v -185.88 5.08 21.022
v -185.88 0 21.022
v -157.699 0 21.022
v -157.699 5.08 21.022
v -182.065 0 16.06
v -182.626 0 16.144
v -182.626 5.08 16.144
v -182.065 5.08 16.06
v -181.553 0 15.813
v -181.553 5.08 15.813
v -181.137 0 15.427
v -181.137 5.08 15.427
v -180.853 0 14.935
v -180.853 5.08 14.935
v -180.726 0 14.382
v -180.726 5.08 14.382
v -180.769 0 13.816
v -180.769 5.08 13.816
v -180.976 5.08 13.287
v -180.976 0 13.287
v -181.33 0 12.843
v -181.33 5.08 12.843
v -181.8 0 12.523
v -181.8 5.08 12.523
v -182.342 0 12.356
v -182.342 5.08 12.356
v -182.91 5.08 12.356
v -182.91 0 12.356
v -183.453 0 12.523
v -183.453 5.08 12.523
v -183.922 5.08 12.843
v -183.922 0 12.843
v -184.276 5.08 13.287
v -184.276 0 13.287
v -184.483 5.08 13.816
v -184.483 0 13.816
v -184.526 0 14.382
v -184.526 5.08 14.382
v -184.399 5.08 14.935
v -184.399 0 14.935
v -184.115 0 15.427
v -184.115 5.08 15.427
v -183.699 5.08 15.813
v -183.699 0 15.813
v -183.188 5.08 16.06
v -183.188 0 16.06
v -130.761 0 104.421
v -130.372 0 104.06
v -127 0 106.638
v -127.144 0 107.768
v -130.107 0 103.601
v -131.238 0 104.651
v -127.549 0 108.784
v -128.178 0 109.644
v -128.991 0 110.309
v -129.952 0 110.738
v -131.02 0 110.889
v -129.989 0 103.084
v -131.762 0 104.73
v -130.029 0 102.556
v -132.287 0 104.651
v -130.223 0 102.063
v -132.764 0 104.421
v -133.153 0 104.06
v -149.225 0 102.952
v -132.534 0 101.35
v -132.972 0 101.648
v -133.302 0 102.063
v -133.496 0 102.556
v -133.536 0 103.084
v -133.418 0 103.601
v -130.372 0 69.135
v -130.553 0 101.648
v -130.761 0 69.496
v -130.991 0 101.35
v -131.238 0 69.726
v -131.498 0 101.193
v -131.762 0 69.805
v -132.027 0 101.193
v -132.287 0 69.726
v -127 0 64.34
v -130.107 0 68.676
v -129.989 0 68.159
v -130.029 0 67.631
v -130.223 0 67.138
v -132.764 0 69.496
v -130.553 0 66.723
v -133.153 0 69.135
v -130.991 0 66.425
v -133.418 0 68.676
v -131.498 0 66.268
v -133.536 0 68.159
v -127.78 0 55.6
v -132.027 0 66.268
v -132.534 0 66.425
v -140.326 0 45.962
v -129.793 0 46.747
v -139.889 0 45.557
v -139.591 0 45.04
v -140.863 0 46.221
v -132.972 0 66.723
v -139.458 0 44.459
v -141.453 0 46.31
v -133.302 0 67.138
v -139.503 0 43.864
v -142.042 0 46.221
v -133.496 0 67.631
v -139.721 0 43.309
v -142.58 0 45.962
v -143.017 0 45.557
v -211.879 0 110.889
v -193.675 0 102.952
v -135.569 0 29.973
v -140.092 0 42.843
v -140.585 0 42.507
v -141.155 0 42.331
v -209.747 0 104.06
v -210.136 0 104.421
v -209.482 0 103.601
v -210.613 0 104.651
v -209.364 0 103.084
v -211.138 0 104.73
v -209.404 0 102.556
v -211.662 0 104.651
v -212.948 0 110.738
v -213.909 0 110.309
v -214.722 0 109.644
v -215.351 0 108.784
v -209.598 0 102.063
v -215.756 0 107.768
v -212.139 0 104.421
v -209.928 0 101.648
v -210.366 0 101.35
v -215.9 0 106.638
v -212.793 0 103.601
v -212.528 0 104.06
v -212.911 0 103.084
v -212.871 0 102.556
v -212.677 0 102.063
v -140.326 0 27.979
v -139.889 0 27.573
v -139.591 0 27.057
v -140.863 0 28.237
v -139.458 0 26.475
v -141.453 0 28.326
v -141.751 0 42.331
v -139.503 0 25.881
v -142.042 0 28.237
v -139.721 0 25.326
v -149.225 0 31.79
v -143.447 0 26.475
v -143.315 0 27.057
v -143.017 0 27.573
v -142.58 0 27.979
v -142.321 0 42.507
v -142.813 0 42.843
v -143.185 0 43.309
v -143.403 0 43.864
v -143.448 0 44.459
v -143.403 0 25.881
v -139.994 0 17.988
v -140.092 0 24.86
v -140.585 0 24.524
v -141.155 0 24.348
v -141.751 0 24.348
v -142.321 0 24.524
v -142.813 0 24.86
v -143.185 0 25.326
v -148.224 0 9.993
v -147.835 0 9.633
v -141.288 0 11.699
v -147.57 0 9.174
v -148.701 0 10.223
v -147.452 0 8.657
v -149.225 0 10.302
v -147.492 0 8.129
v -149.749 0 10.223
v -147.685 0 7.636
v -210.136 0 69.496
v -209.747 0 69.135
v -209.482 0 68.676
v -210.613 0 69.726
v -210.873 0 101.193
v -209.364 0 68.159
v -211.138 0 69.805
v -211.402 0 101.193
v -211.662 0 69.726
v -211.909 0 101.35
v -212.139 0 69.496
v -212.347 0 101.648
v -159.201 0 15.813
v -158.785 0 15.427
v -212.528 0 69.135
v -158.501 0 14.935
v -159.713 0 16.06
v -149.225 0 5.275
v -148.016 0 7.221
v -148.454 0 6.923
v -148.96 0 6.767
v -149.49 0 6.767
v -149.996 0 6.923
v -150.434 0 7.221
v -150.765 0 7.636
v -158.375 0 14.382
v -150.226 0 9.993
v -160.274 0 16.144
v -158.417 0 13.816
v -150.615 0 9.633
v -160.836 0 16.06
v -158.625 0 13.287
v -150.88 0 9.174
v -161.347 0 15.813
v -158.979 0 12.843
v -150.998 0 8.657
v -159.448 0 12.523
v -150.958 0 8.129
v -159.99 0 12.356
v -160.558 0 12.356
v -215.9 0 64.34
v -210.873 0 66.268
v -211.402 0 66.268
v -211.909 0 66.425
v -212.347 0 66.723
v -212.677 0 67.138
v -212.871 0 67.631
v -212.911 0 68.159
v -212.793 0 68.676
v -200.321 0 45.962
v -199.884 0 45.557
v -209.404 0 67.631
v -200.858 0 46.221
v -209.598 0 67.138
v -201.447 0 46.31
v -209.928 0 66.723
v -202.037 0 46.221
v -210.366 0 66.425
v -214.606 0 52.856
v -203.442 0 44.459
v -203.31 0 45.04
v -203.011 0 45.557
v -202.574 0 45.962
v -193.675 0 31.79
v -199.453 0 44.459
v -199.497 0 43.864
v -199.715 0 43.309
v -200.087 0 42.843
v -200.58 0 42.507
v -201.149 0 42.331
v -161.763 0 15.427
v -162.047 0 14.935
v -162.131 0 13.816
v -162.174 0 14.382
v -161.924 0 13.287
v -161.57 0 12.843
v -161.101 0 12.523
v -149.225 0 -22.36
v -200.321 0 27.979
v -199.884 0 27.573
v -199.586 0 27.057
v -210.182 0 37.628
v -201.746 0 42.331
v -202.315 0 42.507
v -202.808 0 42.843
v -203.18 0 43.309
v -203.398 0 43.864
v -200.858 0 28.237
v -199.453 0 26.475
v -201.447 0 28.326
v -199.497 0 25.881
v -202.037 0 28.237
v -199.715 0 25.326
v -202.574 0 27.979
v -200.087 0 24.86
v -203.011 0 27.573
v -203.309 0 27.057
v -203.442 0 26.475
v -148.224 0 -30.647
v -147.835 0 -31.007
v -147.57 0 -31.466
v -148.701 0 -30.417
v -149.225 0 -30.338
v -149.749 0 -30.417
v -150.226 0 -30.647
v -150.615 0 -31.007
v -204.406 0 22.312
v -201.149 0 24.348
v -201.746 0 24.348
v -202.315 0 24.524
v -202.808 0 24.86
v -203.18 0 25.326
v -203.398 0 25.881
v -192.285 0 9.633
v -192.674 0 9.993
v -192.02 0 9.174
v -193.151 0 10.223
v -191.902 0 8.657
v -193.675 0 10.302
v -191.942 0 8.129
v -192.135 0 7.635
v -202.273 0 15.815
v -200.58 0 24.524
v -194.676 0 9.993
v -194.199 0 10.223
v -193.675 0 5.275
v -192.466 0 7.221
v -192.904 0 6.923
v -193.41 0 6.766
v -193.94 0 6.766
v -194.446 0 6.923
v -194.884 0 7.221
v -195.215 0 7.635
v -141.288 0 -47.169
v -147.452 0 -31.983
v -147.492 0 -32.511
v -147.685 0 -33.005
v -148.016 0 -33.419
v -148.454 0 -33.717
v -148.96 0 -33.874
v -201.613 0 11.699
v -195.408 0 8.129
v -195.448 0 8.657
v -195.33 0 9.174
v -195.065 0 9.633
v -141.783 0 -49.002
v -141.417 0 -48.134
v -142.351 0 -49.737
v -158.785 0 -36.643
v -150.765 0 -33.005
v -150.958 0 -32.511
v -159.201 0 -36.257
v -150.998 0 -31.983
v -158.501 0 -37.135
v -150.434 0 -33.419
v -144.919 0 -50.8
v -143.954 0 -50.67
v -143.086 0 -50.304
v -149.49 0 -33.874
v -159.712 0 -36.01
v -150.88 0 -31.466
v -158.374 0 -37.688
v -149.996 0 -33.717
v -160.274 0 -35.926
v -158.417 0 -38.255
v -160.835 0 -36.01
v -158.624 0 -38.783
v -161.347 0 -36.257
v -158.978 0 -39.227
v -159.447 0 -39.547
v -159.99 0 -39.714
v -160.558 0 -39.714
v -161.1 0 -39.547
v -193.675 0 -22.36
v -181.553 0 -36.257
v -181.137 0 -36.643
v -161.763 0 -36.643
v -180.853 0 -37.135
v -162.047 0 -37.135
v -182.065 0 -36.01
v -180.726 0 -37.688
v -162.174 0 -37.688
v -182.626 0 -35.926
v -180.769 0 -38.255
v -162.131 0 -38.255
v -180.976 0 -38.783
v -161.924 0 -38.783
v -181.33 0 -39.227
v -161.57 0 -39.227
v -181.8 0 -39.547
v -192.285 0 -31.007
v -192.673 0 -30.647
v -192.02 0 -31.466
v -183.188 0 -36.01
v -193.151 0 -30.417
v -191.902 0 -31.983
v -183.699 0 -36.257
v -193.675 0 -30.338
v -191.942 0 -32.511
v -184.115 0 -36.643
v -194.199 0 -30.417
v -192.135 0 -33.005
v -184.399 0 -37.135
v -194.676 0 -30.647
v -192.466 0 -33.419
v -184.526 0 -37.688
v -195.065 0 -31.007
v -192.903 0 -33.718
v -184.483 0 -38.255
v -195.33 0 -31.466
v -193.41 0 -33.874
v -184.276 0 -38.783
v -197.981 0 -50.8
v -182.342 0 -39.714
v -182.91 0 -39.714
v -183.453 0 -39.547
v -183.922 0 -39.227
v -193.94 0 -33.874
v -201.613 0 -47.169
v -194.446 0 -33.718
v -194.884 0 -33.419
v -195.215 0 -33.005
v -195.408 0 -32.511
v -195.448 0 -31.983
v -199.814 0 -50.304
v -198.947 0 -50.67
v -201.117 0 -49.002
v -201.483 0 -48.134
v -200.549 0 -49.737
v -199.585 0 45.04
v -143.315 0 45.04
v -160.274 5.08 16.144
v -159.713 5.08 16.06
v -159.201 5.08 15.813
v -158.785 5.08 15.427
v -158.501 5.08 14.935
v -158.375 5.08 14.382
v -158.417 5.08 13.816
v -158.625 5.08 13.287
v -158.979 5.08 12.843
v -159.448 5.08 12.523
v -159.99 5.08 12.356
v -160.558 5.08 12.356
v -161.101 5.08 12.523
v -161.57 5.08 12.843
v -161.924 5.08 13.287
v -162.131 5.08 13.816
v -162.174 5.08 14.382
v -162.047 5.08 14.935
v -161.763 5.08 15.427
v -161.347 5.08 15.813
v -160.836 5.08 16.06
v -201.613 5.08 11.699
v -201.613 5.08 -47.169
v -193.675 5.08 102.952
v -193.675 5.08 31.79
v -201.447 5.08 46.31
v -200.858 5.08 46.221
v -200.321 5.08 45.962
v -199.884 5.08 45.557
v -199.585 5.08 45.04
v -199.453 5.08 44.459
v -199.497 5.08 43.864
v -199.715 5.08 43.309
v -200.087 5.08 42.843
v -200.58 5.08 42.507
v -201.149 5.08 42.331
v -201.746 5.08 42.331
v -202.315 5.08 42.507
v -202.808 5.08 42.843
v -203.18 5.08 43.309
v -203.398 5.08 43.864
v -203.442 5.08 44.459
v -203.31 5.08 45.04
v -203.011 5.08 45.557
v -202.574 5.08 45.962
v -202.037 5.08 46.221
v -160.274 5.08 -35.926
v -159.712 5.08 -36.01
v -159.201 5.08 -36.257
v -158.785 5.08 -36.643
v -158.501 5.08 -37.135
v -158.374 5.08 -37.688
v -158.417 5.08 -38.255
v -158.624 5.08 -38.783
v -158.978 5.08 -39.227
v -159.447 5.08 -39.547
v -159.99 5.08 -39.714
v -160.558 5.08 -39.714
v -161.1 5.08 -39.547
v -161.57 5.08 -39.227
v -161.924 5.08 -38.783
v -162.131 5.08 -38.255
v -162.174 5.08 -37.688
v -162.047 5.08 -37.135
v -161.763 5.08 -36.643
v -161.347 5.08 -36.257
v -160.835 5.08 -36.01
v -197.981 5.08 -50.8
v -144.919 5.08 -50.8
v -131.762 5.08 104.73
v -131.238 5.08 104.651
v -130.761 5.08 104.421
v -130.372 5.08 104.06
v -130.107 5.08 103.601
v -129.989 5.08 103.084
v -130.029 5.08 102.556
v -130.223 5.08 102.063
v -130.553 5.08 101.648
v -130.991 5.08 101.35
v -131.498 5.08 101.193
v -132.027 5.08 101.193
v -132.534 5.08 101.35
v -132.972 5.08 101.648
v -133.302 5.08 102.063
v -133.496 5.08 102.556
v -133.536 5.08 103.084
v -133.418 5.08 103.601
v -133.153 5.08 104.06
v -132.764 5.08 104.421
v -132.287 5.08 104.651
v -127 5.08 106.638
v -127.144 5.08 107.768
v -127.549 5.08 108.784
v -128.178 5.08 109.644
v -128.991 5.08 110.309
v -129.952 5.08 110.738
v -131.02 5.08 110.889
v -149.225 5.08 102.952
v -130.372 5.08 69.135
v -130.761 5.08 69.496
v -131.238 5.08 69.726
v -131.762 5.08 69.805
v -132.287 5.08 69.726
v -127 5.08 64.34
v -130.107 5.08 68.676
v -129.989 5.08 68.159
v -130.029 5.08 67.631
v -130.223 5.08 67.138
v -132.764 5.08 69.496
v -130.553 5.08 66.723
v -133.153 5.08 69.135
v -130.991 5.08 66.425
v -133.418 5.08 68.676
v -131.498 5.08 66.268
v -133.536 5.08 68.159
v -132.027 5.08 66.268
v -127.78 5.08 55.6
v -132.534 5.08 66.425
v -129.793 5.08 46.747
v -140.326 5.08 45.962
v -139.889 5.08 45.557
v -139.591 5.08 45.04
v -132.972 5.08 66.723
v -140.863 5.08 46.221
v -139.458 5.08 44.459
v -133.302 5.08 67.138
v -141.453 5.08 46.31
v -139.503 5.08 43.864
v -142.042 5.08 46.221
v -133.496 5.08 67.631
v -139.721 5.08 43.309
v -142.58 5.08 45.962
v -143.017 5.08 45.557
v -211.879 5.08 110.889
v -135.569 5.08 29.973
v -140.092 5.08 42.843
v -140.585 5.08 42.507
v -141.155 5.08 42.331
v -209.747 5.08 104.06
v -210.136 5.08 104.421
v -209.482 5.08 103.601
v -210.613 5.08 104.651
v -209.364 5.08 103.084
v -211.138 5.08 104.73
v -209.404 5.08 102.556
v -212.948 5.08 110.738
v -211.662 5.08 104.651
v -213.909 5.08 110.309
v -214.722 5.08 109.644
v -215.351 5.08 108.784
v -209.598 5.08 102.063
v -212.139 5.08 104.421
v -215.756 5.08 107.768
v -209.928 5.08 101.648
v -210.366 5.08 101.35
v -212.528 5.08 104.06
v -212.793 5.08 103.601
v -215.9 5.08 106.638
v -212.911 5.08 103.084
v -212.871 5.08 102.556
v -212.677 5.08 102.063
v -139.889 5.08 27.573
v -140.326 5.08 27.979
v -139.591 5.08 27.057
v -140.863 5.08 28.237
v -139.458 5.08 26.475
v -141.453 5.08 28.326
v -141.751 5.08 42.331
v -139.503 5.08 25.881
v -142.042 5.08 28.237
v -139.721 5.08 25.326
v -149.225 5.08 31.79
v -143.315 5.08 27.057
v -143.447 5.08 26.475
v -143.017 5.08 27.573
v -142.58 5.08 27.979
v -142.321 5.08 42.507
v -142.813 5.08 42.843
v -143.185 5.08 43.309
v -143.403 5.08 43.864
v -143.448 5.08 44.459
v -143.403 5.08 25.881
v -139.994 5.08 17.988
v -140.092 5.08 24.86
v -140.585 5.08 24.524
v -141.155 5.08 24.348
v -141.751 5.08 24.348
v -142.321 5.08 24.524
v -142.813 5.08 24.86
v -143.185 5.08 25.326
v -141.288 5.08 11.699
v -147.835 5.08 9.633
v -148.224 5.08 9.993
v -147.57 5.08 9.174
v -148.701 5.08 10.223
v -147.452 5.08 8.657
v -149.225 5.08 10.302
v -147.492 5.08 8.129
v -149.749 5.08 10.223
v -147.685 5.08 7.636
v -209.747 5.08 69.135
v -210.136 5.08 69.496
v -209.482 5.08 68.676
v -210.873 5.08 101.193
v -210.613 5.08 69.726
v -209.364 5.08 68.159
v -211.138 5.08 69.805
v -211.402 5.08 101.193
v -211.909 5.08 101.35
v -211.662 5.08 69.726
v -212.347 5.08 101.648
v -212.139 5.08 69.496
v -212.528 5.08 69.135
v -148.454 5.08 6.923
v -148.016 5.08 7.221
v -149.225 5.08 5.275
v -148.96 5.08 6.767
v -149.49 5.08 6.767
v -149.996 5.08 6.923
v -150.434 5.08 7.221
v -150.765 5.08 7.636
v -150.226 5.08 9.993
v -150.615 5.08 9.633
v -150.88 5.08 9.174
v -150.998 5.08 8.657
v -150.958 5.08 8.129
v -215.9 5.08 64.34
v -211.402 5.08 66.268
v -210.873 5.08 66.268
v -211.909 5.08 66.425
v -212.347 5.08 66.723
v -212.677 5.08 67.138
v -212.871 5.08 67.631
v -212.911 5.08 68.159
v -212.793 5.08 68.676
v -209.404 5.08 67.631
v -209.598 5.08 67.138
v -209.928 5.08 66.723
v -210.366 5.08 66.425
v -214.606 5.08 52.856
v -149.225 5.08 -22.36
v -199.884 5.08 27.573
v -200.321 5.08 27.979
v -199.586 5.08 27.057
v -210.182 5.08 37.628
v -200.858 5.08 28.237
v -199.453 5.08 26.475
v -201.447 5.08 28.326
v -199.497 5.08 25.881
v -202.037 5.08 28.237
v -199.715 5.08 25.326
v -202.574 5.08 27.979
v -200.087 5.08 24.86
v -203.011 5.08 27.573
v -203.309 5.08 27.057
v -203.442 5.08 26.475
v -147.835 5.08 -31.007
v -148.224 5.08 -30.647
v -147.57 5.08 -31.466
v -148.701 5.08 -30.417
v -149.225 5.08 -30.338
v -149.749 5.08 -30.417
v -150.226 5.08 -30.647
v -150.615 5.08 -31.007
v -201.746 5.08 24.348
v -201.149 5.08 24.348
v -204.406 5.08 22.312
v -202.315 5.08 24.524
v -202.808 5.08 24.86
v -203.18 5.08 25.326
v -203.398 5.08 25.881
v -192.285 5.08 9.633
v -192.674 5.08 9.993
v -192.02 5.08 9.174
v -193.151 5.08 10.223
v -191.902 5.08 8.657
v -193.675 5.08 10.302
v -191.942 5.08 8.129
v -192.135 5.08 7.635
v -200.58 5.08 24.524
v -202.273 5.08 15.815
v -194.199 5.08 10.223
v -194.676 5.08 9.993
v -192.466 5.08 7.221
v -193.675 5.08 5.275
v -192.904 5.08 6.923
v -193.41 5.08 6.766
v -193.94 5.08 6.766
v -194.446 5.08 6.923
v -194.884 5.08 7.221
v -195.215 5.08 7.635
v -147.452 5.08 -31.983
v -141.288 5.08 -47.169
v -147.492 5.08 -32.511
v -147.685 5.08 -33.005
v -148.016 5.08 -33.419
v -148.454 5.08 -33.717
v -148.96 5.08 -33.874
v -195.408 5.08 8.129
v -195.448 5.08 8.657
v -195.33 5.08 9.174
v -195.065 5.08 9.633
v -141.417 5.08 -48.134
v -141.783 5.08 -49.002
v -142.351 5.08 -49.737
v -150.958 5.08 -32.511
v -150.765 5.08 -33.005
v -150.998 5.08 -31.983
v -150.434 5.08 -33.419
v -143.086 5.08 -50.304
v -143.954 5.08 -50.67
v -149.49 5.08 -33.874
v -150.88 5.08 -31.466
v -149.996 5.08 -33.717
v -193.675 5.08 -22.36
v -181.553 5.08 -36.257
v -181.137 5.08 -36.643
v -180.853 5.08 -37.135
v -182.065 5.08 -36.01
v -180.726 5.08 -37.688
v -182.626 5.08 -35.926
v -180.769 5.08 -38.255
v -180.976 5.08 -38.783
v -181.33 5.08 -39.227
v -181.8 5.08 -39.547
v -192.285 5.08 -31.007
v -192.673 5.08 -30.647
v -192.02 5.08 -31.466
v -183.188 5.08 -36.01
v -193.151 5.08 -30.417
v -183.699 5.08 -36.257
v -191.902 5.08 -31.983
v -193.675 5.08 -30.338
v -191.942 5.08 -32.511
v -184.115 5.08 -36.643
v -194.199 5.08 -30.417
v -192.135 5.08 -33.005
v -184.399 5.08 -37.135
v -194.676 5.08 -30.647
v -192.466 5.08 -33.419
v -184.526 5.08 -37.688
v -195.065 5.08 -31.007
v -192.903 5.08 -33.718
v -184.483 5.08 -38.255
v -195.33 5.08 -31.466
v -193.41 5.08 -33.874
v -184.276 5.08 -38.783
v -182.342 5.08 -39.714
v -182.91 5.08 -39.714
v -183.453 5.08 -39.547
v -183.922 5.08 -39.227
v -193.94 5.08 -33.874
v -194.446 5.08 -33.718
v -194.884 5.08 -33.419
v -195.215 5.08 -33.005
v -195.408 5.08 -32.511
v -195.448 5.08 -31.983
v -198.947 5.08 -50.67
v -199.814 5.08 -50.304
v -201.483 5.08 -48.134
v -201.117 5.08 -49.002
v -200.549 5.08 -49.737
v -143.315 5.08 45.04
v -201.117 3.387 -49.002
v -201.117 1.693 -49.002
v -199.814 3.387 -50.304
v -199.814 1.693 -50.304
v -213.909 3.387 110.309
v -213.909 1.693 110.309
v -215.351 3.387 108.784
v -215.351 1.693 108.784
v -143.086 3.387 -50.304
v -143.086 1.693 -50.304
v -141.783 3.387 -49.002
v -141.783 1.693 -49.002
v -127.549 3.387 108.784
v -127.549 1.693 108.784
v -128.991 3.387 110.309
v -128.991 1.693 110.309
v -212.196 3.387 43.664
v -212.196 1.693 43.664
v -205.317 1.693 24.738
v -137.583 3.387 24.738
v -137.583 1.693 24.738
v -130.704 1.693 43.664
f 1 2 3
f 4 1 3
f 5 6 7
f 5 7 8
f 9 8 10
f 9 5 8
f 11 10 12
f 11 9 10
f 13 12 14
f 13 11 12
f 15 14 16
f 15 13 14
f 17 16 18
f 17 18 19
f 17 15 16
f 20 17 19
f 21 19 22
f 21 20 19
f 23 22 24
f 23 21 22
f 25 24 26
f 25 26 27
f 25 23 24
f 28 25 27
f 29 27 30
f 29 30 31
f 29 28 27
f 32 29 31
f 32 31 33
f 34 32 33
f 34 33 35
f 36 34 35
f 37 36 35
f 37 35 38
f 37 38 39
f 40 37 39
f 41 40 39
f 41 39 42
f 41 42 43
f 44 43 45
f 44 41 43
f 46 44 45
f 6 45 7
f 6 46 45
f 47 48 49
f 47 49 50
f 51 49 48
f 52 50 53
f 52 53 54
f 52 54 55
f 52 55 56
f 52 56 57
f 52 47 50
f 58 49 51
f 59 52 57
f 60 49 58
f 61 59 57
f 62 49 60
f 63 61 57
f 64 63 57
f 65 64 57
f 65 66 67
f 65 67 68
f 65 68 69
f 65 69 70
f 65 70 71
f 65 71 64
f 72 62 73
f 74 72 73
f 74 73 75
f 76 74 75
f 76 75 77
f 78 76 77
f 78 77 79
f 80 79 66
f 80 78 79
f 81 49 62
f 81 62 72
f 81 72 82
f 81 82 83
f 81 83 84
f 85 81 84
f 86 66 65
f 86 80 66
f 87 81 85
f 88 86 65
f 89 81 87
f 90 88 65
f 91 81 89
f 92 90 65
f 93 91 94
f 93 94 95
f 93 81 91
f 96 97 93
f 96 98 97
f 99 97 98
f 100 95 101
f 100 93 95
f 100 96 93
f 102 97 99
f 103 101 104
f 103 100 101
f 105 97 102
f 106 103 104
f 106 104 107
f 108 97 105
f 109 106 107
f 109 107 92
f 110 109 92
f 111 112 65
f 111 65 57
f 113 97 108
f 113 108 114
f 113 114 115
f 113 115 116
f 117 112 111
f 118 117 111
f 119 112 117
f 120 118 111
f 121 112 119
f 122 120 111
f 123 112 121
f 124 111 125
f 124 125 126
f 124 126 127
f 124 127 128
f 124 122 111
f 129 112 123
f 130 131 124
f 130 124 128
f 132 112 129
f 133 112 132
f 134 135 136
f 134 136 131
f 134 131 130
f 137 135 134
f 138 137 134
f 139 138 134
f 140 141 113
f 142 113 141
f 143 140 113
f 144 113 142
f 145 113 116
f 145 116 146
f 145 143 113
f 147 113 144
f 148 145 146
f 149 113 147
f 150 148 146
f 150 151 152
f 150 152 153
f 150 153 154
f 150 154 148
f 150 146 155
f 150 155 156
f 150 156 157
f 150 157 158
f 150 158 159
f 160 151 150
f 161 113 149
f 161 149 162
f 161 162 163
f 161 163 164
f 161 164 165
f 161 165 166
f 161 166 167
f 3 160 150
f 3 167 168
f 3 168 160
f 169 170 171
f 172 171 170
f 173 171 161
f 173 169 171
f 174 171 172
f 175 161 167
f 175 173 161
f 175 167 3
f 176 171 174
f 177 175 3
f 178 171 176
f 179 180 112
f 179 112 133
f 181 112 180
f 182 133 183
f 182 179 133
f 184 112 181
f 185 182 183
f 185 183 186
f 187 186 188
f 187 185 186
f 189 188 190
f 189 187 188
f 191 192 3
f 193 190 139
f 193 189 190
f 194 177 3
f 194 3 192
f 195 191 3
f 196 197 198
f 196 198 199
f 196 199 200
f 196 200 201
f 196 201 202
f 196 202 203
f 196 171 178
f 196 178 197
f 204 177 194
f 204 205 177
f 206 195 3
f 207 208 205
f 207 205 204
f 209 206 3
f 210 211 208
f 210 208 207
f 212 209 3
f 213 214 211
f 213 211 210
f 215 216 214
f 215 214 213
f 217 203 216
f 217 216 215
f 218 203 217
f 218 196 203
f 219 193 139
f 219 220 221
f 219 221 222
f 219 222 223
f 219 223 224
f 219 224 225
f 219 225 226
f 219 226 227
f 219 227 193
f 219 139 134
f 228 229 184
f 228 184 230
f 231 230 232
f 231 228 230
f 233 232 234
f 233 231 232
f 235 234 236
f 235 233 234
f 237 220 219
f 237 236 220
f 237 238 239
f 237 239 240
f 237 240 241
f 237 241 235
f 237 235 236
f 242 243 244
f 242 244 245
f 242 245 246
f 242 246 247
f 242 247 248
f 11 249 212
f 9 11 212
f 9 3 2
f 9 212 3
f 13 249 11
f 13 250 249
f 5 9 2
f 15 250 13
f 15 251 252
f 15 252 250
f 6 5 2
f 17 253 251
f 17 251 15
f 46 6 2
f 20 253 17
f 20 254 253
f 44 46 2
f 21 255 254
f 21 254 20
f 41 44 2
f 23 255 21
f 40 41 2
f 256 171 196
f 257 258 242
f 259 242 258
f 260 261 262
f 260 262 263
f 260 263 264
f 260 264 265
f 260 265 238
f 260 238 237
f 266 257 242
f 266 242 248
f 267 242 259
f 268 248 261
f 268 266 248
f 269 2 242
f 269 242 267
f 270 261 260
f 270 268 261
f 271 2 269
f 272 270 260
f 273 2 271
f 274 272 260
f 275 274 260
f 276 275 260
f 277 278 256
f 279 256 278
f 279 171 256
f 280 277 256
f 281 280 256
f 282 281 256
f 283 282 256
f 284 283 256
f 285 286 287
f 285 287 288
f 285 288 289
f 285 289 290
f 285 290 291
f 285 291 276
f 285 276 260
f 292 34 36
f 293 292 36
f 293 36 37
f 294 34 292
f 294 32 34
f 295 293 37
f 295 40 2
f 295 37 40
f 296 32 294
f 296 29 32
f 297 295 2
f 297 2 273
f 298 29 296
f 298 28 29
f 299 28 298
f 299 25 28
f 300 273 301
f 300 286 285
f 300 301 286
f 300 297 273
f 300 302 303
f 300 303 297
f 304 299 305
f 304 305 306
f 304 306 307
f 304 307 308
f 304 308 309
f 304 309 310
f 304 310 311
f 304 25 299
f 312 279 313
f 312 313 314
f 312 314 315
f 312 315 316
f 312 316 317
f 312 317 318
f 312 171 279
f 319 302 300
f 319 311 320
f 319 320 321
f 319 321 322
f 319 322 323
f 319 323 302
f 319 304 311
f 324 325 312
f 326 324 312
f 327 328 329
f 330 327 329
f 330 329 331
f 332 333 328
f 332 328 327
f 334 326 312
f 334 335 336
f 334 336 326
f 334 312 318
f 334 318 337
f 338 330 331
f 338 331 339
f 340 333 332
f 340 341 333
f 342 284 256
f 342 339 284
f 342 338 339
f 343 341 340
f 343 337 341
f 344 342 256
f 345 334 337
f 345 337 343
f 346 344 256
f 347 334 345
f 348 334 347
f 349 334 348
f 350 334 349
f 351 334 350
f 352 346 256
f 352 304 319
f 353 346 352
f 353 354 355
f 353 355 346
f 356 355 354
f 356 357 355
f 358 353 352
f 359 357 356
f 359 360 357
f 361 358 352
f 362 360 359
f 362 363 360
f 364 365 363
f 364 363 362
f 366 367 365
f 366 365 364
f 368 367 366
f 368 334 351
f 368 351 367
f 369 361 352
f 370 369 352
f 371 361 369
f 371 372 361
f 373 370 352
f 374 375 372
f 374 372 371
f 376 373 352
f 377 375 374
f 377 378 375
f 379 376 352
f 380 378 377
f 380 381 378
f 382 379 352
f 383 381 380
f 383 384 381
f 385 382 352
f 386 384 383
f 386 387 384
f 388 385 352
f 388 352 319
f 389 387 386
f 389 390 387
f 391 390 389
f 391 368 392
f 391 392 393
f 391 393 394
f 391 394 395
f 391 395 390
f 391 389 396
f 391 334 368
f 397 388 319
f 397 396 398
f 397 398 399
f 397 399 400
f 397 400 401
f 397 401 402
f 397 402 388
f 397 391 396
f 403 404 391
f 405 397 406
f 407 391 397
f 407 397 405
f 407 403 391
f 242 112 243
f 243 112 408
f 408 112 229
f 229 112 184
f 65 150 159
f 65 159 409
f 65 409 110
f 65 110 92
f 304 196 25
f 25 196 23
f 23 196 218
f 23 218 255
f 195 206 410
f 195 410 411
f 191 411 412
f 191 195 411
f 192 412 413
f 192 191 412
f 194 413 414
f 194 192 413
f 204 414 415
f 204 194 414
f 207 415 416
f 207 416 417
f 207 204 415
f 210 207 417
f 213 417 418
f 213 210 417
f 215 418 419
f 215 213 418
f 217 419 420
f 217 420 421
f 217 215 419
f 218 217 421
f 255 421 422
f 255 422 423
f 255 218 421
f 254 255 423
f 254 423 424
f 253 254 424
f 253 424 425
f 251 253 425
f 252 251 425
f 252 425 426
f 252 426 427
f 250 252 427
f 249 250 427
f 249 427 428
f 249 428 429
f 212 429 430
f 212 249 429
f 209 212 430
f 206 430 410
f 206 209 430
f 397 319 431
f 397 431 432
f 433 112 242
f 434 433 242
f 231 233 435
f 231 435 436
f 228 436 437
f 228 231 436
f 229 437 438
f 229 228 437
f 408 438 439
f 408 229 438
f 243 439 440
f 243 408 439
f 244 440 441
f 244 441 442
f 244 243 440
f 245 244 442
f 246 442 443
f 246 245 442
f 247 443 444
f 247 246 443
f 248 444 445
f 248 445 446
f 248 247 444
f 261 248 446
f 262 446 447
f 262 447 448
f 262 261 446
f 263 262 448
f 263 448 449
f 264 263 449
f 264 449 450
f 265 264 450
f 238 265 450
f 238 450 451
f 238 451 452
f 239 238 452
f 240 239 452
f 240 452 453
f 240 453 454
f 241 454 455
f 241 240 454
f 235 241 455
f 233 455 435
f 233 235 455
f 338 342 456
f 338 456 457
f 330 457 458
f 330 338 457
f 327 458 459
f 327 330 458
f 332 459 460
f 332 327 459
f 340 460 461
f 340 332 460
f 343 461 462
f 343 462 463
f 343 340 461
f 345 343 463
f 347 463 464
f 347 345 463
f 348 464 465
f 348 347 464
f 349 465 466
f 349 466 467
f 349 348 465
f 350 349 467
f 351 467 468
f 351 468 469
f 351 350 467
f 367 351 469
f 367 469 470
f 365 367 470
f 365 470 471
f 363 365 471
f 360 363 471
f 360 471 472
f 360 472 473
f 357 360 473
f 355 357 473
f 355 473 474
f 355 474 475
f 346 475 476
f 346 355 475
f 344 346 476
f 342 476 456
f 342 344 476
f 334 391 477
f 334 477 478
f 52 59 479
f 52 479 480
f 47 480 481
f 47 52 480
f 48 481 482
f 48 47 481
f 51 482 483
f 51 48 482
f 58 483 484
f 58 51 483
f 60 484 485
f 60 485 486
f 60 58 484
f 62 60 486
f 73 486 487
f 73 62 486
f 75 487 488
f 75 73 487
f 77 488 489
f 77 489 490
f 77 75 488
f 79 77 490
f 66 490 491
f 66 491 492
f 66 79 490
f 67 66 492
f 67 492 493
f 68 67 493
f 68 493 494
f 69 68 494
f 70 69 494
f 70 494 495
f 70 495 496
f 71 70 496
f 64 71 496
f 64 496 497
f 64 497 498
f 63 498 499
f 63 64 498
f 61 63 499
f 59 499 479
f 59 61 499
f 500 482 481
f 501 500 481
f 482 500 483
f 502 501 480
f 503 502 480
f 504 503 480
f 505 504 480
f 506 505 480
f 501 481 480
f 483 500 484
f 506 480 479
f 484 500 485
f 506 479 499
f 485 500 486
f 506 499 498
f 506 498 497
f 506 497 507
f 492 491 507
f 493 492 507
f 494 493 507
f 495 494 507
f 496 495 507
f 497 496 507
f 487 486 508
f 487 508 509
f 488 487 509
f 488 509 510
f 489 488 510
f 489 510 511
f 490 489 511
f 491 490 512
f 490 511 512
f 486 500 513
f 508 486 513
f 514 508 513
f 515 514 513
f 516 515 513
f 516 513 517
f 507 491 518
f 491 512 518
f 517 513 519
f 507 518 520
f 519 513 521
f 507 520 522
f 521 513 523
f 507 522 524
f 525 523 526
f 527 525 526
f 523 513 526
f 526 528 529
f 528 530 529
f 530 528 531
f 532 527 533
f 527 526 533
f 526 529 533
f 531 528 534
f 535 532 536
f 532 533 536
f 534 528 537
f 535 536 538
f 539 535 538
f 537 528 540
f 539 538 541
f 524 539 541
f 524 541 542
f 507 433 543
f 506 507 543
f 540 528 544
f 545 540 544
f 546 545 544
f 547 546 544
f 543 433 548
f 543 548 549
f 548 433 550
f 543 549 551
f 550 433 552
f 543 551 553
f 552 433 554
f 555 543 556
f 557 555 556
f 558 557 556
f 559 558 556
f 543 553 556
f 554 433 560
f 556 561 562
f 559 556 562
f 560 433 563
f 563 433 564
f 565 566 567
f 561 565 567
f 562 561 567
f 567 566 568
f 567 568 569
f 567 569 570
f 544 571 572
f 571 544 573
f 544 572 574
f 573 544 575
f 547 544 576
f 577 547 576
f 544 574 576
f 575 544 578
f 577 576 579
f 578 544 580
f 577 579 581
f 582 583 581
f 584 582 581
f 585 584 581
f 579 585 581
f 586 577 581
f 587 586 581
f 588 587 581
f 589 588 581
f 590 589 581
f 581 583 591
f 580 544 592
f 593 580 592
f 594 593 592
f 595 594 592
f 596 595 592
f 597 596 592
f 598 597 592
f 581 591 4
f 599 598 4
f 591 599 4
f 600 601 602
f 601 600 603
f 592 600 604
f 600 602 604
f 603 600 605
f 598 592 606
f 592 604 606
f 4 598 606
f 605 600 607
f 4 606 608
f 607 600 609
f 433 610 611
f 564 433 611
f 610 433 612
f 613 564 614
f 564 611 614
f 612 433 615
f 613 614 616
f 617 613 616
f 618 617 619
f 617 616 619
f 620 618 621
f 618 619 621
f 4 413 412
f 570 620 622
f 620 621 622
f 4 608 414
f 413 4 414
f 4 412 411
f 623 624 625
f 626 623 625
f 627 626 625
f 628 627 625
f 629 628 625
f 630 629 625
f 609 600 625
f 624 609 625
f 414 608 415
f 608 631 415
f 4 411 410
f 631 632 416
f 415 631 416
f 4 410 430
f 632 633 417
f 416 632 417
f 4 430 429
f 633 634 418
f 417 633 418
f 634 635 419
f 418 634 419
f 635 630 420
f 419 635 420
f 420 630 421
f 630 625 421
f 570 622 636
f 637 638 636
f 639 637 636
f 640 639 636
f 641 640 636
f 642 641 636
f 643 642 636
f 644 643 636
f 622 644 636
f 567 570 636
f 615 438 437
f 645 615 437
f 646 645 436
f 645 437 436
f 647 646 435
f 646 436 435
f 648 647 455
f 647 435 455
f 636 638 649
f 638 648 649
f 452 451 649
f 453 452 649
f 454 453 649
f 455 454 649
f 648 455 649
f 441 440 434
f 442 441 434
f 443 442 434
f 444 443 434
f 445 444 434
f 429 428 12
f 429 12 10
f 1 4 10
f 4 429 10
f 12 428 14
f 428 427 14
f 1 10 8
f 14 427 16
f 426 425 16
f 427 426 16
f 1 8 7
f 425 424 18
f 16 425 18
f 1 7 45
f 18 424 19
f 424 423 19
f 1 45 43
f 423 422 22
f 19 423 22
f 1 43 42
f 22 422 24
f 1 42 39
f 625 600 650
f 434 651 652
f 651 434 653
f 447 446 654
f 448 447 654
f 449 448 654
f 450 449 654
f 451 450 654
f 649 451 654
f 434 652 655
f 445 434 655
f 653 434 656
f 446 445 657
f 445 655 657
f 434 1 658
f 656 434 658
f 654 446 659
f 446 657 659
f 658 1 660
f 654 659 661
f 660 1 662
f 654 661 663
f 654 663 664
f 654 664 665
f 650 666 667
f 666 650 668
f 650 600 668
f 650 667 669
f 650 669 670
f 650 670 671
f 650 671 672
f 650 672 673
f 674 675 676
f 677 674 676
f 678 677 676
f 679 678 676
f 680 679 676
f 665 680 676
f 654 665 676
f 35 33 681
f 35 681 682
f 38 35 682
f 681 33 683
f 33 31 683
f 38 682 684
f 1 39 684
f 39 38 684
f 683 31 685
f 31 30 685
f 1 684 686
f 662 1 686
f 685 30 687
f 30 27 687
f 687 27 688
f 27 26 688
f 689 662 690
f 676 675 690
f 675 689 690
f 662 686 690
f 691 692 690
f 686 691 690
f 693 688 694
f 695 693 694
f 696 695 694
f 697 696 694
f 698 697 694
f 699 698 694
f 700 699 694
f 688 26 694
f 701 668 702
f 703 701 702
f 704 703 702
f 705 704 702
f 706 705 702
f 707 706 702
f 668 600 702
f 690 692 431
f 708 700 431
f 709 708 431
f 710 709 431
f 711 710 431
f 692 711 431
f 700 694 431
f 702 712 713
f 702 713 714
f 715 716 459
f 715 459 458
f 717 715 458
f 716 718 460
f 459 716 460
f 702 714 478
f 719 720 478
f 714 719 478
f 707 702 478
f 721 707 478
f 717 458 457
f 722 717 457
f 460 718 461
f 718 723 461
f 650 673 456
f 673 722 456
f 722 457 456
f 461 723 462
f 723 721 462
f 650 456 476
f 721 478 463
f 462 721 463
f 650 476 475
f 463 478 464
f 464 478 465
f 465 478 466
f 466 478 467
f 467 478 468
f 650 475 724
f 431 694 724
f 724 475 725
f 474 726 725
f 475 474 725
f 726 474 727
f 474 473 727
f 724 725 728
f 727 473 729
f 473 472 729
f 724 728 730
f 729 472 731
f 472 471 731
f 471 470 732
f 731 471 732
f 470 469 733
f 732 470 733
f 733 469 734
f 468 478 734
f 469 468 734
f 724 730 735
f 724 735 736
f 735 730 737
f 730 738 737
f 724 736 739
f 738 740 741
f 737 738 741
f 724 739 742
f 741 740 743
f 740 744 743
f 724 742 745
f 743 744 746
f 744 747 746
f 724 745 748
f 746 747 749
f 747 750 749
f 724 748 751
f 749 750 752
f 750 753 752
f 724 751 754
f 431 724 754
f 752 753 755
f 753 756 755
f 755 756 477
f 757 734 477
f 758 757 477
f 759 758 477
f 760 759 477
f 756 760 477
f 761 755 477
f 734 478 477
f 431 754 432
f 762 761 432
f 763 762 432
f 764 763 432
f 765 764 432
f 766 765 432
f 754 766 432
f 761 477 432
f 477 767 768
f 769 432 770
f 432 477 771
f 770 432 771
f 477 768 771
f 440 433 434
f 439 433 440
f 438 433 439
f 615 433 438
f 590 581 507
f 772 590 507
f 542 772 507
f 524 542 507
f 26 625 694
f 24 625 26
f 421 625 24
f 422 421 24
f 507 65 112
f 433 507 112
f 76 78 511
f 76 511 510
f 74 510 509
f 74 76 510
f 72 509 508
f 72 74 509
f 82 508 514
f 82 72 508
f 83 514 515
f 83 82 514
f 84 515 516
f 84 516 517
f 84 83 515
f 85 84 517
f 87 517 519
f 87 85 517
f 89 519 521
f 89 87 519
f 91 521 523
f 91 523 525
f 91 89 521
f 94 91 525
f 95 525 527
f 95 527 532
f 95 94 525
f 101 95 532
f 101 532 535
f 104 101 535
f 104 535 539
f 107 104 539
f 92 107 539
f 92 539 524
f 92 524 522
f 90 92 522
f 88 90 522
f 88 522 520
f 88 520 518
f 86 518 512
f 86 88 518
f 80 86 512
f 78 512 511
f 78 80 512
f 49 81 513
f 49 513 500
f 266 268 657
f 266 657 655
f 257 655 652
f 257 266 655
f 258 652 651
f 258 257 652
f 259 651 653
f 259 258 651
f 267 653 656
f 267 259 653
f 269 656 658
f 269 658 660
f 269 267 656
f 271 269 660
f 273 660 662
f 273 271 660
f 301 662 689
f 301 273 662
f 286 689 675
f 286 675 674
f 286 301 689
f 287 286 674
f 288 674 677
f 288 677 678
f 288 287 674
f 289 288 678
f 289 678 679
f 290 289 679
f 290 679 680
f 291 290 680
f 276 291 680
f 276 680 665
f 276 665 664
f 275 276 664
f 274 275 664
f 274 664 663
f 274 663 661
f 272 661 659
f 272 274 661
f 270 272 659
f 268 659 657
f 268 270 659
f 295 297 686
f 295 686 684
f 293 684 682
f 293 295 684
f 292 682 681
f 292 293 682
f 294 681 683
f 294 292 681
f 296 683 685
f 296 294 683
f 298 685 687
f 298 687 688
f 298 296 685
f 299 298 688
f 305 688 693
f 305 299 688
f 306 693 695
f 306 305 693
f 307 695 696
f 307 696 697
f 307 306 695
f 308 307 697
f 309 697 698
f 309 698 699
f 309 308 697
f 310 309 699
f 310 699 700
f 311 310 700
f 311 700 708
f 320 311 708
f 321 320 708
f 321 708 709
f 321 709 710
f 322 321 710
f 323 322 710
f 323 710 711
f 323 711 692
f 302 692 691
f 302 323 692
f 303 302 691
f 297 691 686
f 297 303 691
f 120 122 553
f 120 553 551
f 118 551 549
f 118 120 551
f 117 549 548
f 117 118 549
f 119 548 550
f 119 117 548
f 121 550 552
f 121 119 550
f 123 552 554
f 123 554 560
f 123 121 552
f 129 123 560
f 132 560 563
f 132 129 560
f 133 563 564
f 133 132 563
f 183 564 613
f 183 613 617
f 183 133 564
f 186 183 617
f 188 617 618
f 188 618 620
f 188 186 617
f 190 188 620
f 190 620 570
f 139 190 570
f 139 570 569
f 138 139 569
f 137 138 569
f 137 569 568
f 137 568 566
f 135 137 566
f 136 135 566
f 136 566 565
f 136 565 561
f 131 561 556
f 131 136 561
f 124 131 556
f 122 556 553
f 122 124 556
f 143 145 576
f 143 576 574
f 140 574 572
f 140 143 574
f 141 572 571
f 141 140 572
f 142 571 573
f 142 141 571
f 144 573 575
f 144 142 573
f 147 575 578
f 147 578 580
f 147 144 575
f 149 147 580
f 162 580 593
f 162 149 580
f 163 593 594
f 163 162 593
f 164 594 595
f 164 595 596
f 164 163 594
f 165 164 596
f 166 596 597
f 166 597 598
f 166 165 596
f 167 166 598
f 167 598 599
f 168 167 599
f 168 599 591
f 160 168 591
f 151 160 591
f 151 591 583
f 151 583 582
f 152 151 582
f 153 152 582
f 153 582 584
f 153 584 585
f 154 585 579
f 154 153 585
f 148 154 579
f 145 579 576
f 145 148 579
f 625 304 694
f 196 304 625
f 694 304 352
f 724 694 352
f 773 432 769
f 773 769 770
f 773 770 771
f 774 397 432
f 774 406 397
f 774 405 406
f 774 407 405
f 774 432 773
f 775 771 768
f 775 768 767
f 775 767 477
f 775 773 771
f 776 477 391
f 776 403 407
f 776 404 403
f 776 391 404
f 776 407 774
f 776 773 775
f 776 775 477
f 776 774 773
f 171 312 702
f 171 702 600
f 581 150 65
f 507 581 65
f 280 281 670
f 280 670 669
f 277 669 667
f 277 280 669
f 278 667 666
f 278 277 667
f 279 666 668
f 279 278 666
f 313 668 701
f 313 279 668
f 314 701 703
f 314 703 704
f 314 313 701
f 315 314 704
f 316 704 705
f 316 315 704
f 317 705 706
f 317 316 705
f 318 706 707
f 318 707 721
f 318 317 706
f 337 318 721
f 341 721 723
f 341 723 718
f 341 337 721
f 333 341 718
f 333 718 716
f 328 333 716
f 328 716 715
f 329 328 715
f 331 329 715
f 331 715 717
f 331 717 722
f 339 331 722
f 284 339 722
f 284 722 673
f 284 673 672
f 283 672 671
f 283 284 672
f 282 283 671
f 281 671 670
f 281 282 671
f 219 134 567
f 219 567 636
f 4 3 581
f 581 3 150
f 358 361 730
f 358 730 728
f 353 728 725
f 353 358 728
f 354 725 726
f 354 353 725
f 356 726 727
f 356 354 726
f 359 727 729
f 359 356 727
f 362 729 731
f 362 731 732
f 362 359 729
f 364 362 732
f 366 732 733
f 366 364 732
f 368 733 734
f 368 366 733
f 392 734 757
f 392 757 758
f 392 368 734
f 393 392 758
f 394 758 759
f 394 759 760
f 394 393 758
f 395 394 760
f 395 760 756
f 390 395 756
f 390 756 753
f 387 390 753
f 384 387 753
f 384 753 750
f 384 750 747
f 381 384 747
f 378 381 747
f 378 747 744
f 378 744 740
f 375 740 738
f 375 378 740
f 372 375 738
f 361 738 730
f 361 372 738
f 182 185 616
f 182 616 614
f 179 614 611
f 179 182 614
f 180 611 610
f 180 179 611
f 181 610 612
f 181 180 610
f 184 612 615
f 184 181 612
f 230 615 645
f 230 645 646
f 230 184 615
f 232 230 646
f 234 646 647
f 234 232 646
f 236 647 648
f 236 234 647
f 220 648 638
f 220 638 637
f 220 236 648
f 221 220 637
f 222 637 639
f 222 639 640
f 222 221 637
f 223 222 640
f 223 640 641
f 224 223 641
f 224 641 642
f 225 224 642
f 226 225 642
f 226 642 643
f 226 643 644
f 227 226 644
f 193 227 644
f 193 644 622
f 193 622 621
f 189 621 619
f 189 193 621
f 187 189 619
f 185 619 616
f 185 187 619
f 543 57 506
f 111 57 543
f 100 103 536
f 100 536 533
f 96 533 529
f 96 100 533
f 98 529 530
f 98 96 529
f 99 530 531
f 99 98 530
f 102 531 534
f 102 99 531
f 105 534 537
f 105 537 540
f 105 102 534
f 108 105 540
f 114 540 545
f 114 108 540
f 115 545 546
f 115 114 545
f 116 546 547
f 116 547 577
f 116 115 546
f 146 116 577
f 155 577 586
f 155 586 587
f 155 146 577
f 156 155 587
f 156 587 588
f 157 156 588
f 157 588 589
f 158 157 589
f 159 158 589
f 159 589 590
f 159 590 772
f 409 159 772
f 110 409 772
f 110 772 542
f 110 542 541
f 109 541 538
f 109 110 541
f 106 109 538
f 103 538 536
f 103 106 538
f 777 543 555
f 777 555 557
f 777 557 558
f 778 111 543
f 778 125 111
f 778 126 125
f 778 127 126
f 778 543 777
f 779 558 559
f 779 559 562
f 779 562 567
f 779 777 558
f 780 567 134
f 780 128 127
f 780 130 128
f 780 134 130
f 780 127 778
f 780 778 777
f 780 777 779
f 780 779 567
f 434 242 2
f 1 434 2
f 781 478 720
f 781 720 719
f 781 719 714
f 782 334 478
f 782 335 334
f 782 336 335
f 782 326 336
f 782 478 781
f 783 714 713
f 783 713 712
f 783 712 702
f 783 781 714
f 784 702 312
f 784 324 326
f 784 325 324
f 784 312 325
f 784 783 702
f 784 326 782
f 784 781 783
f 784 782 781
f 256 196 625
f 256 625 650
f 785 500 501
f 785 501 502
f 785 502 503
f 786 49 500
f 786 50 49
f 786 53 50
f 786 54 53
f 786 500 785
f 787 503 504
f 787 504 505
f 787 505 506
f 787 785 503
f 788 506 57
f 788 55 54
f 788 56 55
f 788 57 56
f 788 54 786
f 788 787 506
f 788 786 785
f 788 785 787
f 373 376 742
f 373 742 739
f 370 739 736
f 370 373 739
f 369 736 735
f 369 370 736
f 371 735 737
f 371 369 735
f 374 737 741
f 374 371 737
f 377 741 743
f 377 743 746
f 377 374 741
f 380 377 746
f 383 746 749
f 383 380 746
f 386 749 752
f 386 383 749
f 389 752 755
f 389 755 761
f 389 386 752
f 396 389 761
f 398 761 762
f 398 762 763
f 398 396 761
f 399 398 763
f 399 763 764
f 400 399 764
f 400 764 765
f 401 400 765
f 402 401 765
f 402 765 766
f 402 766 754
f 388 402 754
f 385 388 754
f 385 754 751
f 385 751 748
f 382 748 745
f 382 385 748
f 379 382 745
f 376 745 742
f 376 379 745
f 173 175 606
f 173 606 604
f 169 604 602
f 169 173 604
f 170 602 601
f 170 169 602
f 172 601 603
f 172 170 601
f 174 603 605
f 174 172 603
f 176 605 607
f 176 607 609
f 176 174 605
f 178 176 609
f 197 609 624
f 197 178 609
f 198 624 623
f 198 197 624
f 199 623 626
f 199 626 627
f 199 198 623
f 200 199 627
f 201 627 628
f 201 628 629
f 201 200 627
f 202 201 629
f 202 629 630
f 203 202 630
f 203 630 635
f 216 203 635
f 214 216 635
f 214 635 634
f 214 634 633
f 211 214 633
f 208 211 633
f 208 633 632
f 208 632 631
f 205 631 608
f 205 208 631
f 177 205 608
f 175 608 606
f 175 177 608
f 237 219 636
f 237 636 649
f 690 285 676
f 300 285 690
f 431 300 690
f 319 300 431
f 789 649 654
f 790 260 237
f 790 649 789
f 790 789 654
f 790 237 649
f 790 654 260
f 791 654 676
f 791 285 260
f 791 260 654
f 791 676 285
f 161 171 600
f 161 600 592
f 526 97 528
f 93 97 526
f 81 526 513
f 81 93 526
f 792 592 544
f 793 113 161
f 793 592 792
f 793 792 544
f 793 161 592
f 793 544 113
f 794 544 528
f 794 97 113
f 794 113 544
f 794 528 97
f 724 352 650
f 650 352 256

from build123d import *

# Parameters (mm, degrees)
SKETCH1_R           = 2.000308567
SKETCH1_R_2         = 2.000222439
SKETCH1_R_3         = 1.777841526
SKETCH1_R_4         = 1.904793294
SKETCH1_R_5         = 1.777669271
SKETCH1_R_6         = 1.777927653
SKETCH1_R_7         = 1.904965549
SKETCH1_R_8         = 1.77801378
SKETCH1_W           = 44.45
SKETCH1_H           = 27.635522461
BOSS_EXTRUDE2_DEPTH = 5.08


with BuildPart() as part:
    # Sketch1 → Boss-Extrude2 (new body)
    with BuildSketch(Plane(origin=(0, 0, 0), x_dir=(1, 0, 0), z_dir=(0, 1, 0))):
        with BuildLine():
            Line((-201.612672255, -11.699372016), (-201.612672255, 47.168869358))
            add(Edge.make_bspline(
                [(-201.612672255, 47.168869358), (-201.612672255, 49.174431695), (-199.986931695, 50.8), (-197.981369358, 50.8)],
                knots=[1, 1, 1, 1, 2, 2, 2, 2], degree=3))
            Line((-197.981369358, 50.8), (-144.918975152, 50.8))
            add(Edge.make_bspline(
                [(-144.918975152, 50.8), (-142.913585069, 50.8), (-141.2875, 49.174431695), (-141.2875, 47.168869358)],
                knots=[3, 3, 3, 3, 4, 4, 4, 4], degree=3))
            Line((-141.2875, 47.168869358), (-141.2875, -11.699372016))
            add(Edge.make_bspline(
                [(-141.2875, -11.699372016), (-141.2875, -20.416152615), (-127, -44.166985406), (-127, -64.33991428)],
                knots=[5, 5, 5, 5, 6, 6, 6, 6], degree=3))
            Line((-127, -64.33991428), (-127, -106.638107639))
            add(Edge.make_bspline(
                [(-127, -106.638107639), (-127, -108.986284722), (-128.800062391, -110.889355469), (-131.020426432, -110.889355469)],
                knots=[7, 7, 7, 7, 8, 8, 8, 8], degree=3))
            Line((-131.020426432, -110.889355469), (-211.879229058, -110.889355469))
            add(Edge.make_bspline(
                [(-211.879229058, -110.889355469), (-214.099765354, -110.889355469), (-215.9, -108.986284722), (-215.9, -106.638107639)],
                knots=[9, 9, 9, 9, 10, 10, 10, 10], degree=3))
            Line((-215.9, -106.638107639), (-215.9, -64.33991428))
            add(Edge.make_bspline(
                [(-215.9, -64.33991428), (-215.9, -44.166985406), (-201.612672255, -20.416152615), (-201.612672255, -11.699372016)],
                knots=[11, 11, 11, 11, 12, 12, 12, 12], degree=3))
        make_face()
        with Locations(Location((-201.447479926, -44.309353977, 0), (0, 0, 270))):
            Circle(SKETCH1_R, mode=Mode.SUBTRACT)
        with Locations(Location((-141.452864583, -44.309353977, 0), (0, 0, 270))):
            Circle(SKETCH1_R, mode=Mode.SUBTRACT)
        with Locations(Location((-141.452864583, -26.325869412, 0), (0, 0, 270))):
            Circle(SKETCH1_R_2, mode=Mode.SUBTRACT)
        with Locations(Location((-193.675, -8.524372016, 0), (0, 0, 270))):
            Circle(SKETCH1_R_3, mode=Mode.SUBTRACT)
        with Locations(Location((-160.274110243, -14.239440918, 0), (0, 0, 270))):
            Circle(SKETCH1_R_4, mode=Mode.SUBTRACT)
        with Locations(Location((-149.225, -8.524372016, 0), (0, 0, 270))):
            Circle(SKETCH1_R_5, mode=Mode.SUBTRACT)
        with Locations(Location((-193.674913873, 32.115696886, 0), (0, 0, 270))):
            Circle(SKETCH1_R_6, mode=Mode.SUBTRACT)
        with Locations(Location((-182.626062012, 37.830765788, 0), (0, 0, 270))):
            Circle(SKETCH1_R_7, mode=Mode.SUBTRACT)
        with Locations(Location((-160.273937988, 37.830765788, 0), (0, 0, 270))):
            Circle(SKETCH1_R_7, mode=Mode.SUBTRACT)
        with Locations(Location((-149.225, 32.115696886, 0), (0, 0, 270))):
            Circle(SKETCH1_R_5, mode=Mode.SUBTRACT)
        with Locations(Location((-182.626062012, -14.239440918, 0), (0, 0, 270))):
            Circle(SKETCH1_R_7, mode=Mode.SUBTRACT)
        with Locations(Location((-201.447479926, -26.325869412, 0), (0, 0, 270))):
            Circle(SKETCH1_R_2, mode=Mode.SUBTRACT)
        with Locations(Location((-211.1375, -68.026510959, 0), (0, 0, 270))):
            Circle(SKETCH1_R_8, mode=Mode.SUBTRACT)
        with Locations(Location((-131.7625, -102.951510959, 0), (0, 0, 270))):
            Circle(SKETCH1_R_8, mode=Mode.SUBTRACT)
        with Locations(Location((-211.1375, -102.951510959, 0), (0, 0, 270))):
            Circle(SKETCH1_R_8, mode=Mode.SUBTRACT)
        with Locations(Location((-131.7625, -68.026510959, 0), (0, 0, 270))):
            Circle(SKETCH1_R_8, mode=Mode.SUBTRACT)
        Polygon((-193.675, -102.951855469), (-193.675, -31.789790853), (-185.880299208, -21.022144911), (-157.698901367, -21.022144911), (-149.225, -31.789790853), (-149.225, -102.951855469), align=None, mode=Mode.SUBTRACT)
        with Locations((-171.45, 8.542458768)):
            Rectangle(SKETCH1_W, SKETCH1_H, mode=Mode.SUBTRACT)
    extrude(amount=BOSS_EXTRUDE2_DEPTH)


solid = part.part
